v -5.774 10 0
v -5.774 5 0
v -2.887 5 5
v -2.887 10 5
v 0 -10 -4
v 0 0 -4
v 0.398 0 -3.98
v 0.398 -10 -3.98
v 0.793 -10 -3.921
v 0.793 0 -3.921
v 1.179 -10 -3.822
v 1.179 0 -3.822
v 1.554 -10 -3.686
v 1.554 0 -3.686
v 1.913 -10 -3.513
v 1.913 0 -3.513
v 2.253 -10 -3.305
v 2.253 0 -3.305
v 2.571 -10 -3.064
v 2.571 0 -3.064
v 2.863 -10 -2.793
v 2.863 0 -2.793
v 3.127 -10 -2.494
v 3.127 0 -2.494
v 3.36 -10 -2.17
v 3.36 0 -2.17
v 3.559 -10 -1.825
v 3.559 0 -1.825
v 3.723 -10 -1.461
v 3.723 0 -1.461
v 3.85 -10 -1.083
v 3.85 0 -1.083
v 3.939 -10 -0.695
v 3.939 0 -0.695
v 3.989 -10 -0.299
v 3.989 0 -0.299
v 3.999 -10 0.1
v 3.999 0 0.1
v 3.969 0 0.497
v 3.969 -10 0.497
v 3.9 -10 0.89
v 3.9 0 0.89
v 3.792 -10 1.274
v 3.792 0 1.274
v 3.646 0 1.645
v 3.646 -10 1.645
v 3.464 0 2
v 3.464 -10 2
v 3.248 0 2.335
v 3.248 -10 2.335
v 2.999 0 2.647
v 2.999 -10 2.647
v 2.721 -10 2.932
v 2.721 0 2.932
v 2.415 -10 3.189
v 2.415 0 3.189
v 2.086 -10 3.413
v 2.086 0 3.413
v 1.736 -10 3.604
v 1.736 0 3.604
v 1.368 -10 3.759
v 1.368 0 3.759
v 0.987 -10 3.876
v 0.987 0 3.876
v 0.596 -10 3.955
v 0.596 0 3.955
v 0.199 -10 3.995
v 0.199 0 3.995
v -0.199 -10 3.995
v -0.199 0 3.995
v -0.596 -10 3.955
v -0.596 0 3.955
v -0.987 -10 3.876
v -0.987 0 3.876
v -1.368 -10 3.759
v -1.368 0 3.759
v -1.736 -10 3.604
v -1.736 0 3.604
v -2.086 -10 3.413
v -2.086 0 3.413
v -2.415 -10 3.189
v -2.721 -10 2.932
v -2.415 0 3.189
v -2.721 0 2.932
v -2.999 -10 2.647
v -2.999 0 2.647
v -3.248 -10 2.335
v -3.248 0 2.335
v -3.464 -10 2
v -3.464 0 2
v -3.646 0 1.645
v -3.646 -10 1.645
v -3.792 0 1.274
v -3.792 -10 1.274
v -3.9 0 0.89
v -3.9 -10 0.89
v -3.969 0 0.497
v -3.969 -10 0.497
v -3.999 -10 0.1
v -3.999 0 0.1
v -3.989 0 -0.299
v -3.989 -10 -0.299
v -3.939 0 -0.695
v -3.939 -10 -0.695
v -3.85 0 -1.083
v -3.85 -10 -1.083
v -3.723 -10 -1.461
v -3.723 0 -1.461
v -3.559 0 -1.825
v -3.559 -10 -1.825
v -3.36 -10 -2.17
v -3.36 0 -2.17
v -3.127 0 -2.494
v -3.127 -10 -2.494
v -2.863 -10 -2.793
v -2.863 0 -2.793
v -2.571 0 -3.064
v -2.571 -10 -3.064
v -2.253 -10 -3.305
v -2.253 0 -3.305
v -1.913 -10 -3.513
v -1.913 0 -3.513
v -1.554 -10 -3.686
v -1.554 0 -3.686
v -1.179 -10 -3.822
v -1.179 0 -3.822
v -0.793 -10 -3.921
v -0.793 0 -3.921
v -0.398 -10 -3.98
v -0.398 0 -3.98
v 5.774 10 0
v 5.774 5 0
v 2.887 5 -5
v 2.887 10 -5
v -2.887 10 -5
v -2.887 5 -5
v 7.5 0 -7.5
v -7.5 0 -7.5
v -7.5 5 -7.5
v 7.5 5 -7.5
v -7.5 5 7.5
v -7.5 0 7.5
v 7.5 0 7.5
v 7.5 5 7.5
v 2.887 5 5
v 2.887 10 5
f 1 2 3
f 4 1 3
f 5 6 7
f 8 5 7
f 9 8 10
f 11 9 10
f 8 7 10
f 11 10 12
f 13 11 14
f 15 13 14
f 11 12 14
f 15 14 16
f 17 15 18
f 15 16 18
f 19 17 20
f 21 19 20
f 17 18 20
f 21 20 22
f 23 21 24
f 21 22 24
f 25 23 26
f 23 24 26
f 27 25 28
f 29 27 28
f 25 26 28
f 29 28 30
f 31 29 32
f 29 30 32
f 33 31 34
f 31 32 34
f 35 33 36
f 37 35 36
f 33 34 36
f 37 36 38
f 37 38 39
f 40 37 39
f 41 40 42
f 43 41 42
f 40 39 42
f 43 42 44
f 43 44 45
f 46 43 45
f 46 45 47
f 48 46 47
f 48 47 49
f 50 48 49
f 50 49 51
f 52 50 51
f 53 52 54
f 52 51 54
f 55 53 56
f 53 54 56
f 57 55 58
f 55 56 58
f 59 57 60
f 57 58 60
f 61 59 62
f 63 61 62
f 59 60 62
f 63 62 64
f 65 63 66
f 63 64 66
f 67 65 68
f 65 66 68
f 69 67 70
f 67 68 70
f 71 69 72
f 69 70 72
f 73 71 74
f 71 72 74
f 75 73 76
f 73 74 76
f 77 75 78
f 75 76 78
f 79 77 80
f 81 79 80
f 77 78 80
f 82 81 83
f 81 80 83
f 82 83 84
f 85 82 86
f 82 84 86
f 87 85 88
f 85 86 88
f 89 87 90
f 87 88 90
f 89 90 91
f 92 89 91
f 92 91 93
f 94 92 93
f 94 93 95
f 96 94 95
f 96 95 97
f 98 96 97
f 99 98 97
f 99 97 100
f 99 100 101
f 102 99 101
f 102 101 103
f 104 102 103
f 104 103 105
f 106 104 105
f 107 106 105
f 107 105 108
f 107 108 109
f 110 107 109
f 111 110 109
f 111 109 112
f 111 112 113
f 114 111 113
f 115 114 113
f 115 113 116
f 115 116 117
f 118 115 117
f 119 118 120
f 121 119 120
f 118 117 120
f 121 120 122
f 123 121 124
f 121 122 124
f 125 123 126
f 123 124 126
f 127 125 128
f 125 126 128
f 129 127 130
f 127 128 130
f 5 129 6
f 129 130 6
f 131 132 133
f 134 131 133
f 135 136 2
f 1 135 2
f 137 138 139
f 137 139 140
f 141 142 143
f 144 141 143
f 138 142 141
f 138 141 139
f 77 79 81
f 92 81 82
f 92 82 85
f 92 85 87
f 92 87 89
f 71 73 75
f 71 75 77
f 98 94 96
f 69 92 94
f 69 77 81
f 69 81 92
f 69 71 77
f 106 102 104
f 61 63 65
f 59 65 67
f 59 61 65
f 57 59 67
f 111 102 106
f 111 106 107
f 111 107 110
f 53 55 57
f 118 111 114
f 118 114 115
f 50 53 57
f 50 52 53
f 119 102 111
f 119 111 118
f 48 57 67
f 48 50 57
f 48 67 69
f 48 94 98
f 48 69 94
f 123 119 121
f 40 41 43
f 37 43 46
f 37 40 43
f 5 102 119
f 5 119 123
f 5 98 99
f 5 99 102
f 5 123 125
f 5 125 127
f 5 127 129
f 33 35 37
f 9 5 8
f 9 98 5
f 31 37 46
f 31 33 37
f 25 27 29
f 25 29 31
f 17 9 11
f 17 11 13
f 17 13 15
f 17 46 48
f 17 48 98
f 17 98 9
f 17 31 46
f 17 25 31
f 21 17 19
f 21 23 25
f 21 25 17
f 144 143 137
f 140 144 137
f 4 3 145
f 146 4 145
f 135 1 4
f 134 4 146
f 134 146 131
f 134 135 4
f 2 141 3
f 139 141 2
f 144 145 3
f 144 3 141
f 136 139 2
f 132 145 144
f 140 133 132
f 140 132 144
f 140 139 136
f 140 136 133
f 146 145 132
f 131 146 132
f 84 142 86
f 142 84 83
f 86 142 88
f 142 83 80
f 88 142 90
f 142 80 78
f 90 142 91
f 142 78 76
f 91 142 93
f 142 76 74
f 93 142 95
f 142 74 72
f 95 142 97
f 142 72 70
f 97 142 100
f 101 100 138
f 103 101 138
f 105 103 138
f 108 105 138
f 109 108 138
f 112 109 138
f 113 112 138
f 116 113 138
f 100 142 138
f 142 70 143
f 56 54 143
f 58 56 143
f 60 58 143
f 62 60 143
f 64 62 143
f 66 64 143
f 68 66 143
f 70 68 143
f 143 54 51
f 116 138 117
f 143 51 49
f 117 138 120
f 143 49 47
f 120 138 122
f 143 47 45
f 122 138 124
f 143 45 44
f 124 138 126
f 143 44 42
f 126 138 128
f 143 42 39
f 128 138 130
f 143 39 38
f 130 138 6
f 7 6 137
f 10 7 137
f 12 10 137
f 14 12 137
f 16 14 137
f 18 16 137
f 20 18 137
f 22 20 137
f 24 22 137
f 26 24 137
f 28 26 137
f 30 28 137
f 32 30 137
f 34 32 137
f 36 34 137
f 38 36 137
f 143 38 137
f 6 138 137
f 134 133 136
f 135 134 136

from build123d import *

# Parameters (mm, degrees)
SKETCH1_W           = 15
SKETCH1_H           = 15
BOSS_EXTRUDE1_DEPTH = 5
BOSS_EXTRUDE2_DEPTH = 5
SKETCH3_R           = 4
BOSS_EXTRUDE3_DEPTH = 10


with BuildPart() as part:
    # Sketch1 → Boss-Extrude1 (new body)
    with BuildSketch(Plane(origin=(0, 0, 0), x_dir=(1, 0, 0), z_dir=(0, 1, 0))):
        Rectangle(SKETCH1_W, SKETCH1_H)
    extrude(amount=BOSS_EXTRUDE1_DEPTH)

    # Sketch2 → Boss-Extrude2 (add)
    with BuildSketch(Plane(origin=(0, 5, 0), x_dir=(1, 0, 0), z_dir=(0, 1, 0))):
        Polygon((-2.886751346, 5), (-5.773502692, 0), (-2.886751346, -5), (2.886751346, -5), (5.773502692, 0), (2.886751346, 5), align=None)
    extrude(amount=BOSS_EXTRUDE2_DEPTH)

    # Sketch3 → Boss-Extrude3 (add)
    with BuildSketch(Plane.XZ):
        with Locations(Location((0, 0, 0), (0, 0, 270))):
            Circle(SKETCH3_R)
    extrude(amount=BOSS_EXTRUDE3_DEPTH)


solid = part.part
